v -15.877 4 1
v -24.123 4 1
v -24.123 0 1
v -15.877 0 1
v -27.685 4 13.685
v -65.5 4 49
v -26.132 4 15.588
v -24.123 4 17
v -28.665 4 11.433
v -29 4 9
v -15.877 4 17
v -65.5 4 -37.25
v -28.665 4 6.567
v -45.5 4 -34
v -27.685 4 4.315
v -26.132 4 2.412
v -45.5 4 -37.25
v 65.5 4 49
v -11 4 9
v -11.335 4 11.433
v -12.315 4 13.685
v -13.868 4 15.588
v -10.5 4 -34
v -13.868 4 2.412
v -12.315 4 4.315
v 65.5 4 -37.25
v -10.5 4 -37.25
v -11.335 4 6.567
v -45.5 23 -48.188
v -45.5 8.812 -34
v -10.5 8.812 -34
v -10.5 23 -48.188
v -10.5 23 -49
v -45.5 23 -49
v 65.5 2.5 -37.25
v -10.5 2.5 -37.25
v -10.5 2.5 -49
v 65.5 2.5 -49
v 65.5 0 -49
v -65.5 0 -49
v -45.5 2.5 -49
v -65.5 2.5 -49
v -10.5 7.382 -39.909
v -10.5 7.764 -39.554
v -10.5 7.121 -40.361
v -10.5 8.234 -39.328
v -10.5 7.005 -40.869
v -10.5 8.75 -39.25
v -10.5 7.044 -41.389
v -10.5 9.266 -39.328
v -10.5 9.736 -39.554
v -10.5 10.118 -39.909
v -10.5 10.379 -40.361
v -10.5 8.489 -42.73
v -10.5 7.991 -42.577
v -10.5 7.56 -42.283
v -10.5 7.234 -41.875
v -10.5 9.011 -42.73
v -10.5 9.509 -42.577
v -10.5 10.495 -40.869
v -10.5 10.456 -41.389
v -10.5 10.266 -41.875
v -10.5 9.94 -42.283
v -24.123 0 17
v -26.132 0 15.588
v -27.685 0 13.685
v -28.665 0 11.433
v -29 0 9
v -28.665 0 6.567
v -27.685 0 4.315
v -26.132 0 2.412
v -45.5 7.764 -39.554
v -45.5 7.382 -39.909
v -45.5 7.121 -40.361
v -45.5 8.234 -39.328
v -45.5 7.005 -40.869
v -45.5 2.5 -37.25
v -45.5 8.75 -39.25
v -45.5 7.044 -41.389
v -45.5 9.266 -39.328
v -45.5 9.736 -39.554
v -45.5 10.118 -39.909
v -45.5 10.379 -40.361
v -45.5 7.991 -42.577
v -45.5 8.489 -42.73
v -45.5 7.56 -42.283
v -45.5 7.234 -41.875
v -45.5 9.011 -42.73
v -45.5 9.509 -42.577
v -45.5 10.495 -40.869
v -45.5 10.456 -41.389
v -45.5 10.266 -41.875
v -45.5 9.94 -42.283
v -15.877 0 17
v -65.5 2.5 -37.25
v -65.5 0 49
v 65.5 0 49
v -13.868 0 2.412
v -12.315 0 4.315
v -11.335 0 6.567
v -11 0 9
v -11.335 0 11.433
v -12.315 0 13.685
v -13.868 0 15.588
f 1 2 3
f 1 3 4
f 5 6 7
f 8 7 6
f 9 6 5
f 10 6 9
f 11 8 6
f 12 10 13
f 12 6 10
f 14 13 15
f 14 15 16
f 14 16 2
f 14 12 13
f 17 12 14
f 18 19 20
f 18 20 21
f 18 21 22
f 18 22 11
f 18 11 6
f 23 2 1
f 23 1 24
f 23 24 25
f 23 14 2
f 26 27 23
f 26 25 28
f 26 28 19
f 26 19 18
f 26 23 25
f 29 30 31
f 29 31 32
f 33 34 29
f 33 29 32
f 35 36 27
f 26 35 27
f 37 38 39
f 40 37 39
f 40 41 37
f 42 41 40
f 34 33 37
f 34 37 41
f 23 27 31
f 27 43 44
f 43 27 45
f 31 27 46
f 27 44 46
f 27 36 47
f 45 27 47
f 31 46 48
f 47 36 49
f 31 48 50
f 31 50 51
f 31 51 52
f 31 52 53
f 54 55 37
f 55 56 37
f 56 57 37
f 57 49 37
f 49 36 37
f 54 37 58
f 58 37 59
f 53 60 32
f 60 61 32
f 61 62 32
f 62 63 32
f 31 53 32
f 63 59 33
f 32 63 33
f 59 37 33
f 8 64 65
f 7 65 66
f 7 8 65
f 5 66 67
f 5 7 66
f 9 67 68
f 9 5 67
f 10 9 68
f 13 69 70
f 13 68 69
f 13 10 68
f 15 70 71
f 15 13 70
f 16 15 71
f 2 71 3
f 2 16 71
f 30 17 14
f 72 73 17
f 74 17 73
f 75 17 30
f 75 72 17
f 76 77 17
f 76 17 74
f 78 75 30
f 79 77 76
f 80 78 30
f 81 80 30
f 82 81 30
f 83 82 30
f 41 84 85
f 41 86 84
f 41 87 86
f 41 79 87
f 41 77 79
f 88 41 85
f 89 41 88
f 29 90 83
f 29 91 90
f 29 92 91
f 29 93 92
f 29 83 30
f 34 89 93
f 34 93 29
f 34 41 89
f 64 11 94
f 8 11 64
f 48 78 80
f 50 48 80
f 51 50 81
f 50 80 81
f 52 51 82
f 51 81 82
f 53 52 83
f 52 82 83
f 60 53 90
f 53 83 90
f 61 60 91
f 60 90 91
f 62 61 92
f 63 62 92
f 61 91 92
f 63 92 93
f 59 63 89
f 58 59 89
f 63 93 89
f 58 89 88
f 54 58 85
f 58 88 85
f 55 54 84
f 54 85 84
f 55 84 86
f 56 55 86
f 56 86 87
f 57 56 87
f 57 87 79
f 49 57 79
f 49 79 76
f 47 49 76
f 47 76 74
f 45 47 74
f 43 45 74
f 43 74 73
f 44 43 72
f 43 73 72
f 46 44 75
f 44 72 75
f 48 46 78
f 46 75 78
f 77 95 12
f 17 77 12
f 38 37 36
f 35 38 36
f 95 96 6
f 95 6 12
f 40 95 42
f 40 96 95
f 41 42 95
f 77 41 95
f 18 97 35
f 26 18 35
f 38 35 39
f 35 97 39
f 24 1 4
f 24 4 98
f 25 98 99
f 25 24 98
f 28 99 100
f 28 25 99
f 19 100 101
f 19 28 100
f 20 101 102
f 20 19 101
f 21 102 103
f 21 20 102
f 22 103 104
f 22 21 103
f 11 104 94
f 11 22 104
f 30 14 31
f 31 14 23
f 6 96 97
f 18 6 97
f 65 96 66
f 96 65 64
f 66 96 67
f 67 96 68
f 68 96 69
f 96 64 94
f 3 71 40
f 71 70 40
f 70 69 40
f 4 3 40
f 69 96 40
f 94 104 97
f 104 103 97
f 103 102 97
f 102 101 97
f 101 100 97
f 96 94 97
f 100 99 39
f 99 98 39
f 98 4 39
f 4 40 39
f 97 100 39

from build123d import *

# Parameters (mm, degrees)
SKETCH1_W               = 131
SKETCH1_H               = 98
BOSS_EXTRUDE1_DEPTH     = 4
LOCK_HOLE_DEPTH         = 82.897802168
SKETCH6_W               = 11.75
SKETCH6_H               = 1.5
CUT_EXTRUDE4_DEPTH      = 131
SKETCH3_W               = 35
SKETCH3_H               = 15
BOSS_EXTRUDE2_DEPTH     = 19
SKETCH4_R               = 1.75
CUT_EXTRUDE2_DEPTH      = 35
CUT_EXTRUDE3_DEPTH      = 124.494939168
CUT_EXTRUDE3_DEPTH_BACK = 124.494939168
SKETCH7_W               = 35
SKETCH7_H               = 1.5
BOSS_EXTRUDE3_DEPTH     = 11.75


with BuildPart() as part:
    # Sketch1 → Boss-Extrude1 (new body)
    with BuildSketch(Plane(origin=(0, 0, 0), x_dir=(1, 0, 0), z_dir=(0, 1, 0))):
        Rectangle(SKETCH1_W, SKETCH1_H)
    extrude(amount=BOSS_EXTRUDE1_DEPTH)

    # Lock → Lock Hole (cut, through all)
    with BuildSketch(Plane(origin=(0, 4, 0), x_dir=(1, 0, 0), z_dir=(0, 1, 0))):
        with BuildLine():
            Line((-24.123105626, -1), (-15.876894374, -1))
            ThreePointArc((-15.876894374, -1), (-11, -9), (-15.876894374, -17))
            Line((-15.876894374, -17), (-24.123105626, -17))
            ThreePointArc((-24.123105626, -17), (-29, -9), (-24.123105626, -1))
        make_face()
    extrude(amount=-LOCK_HOLE_DEPTH, mode=Mode.SUBTRACT)

    # Sketch6 → Cut-Extrude4 (cut)
    with BuildSketch(Plane.ZY.offset(65.5)):
        with Locations((-43.125, 3.25)):
            Rectangle(SKETCH6_W, SKETCH6_H)
    extrude(amount=-CUT_EXTRUDE4_DEPTH, mode=Mode.SUBTRACT)

    # Sketch3 → Boss-Extrude2 (add)
    with BuildSketch(Plane(origin=(0, 4, 0), x_dir=(1, 0, 0), z_dir=(0, 1, 0))):
        with Locations((-28, 41.5)):
            Rectangle(SKETCH3_W, SKETCH3_H)
    extrude(amount=BOSS_EXTRUDE2_DEPTH)

    # Sketch4 → Cut-Extrude2 (cut)
    with BuildSketch(Plane.ZY.offset(45.5)):
        with Locations((-41, 8.75)):
            Circle(SKETCH4_R)
    extrude(amount=-CUT_EXTRUDE2_DEPTH, mode=Mode.SUBTRACT)

    # Sketch5 → Cut-Extrude3 (cut, two sides: drawn at the far end of the back side and taken through both)
    with BuildSketch(Plane.ZY.offset(45.5).offset(-CUT_EXTRUDE3_DEPTH_BACK)):
        Polygon((-34, 8.811703297), (-48.188296703, 23), (-34, 23), align=None)
    extrude(amount=CUT_EXTRUDE3_DEPTH + CUT_EXTRUDE3_DEPTH_BACK, mode=Mode.SUBTRACT)

    # Sketch7 → Boss-Extrude3 (add)
    with BuildSketch(Plane(origin=(0, 0, -49), x_dir=(-1, 0, 0), z_dir=(0, 0, -1))):
        with Locations((28, 3.25)):
            Rectangle(SKETCH7_W, SKETCH7_H)
    extrude(amount=-BOSS_EXTRUDE3_DEPTH)


solid = part.part
